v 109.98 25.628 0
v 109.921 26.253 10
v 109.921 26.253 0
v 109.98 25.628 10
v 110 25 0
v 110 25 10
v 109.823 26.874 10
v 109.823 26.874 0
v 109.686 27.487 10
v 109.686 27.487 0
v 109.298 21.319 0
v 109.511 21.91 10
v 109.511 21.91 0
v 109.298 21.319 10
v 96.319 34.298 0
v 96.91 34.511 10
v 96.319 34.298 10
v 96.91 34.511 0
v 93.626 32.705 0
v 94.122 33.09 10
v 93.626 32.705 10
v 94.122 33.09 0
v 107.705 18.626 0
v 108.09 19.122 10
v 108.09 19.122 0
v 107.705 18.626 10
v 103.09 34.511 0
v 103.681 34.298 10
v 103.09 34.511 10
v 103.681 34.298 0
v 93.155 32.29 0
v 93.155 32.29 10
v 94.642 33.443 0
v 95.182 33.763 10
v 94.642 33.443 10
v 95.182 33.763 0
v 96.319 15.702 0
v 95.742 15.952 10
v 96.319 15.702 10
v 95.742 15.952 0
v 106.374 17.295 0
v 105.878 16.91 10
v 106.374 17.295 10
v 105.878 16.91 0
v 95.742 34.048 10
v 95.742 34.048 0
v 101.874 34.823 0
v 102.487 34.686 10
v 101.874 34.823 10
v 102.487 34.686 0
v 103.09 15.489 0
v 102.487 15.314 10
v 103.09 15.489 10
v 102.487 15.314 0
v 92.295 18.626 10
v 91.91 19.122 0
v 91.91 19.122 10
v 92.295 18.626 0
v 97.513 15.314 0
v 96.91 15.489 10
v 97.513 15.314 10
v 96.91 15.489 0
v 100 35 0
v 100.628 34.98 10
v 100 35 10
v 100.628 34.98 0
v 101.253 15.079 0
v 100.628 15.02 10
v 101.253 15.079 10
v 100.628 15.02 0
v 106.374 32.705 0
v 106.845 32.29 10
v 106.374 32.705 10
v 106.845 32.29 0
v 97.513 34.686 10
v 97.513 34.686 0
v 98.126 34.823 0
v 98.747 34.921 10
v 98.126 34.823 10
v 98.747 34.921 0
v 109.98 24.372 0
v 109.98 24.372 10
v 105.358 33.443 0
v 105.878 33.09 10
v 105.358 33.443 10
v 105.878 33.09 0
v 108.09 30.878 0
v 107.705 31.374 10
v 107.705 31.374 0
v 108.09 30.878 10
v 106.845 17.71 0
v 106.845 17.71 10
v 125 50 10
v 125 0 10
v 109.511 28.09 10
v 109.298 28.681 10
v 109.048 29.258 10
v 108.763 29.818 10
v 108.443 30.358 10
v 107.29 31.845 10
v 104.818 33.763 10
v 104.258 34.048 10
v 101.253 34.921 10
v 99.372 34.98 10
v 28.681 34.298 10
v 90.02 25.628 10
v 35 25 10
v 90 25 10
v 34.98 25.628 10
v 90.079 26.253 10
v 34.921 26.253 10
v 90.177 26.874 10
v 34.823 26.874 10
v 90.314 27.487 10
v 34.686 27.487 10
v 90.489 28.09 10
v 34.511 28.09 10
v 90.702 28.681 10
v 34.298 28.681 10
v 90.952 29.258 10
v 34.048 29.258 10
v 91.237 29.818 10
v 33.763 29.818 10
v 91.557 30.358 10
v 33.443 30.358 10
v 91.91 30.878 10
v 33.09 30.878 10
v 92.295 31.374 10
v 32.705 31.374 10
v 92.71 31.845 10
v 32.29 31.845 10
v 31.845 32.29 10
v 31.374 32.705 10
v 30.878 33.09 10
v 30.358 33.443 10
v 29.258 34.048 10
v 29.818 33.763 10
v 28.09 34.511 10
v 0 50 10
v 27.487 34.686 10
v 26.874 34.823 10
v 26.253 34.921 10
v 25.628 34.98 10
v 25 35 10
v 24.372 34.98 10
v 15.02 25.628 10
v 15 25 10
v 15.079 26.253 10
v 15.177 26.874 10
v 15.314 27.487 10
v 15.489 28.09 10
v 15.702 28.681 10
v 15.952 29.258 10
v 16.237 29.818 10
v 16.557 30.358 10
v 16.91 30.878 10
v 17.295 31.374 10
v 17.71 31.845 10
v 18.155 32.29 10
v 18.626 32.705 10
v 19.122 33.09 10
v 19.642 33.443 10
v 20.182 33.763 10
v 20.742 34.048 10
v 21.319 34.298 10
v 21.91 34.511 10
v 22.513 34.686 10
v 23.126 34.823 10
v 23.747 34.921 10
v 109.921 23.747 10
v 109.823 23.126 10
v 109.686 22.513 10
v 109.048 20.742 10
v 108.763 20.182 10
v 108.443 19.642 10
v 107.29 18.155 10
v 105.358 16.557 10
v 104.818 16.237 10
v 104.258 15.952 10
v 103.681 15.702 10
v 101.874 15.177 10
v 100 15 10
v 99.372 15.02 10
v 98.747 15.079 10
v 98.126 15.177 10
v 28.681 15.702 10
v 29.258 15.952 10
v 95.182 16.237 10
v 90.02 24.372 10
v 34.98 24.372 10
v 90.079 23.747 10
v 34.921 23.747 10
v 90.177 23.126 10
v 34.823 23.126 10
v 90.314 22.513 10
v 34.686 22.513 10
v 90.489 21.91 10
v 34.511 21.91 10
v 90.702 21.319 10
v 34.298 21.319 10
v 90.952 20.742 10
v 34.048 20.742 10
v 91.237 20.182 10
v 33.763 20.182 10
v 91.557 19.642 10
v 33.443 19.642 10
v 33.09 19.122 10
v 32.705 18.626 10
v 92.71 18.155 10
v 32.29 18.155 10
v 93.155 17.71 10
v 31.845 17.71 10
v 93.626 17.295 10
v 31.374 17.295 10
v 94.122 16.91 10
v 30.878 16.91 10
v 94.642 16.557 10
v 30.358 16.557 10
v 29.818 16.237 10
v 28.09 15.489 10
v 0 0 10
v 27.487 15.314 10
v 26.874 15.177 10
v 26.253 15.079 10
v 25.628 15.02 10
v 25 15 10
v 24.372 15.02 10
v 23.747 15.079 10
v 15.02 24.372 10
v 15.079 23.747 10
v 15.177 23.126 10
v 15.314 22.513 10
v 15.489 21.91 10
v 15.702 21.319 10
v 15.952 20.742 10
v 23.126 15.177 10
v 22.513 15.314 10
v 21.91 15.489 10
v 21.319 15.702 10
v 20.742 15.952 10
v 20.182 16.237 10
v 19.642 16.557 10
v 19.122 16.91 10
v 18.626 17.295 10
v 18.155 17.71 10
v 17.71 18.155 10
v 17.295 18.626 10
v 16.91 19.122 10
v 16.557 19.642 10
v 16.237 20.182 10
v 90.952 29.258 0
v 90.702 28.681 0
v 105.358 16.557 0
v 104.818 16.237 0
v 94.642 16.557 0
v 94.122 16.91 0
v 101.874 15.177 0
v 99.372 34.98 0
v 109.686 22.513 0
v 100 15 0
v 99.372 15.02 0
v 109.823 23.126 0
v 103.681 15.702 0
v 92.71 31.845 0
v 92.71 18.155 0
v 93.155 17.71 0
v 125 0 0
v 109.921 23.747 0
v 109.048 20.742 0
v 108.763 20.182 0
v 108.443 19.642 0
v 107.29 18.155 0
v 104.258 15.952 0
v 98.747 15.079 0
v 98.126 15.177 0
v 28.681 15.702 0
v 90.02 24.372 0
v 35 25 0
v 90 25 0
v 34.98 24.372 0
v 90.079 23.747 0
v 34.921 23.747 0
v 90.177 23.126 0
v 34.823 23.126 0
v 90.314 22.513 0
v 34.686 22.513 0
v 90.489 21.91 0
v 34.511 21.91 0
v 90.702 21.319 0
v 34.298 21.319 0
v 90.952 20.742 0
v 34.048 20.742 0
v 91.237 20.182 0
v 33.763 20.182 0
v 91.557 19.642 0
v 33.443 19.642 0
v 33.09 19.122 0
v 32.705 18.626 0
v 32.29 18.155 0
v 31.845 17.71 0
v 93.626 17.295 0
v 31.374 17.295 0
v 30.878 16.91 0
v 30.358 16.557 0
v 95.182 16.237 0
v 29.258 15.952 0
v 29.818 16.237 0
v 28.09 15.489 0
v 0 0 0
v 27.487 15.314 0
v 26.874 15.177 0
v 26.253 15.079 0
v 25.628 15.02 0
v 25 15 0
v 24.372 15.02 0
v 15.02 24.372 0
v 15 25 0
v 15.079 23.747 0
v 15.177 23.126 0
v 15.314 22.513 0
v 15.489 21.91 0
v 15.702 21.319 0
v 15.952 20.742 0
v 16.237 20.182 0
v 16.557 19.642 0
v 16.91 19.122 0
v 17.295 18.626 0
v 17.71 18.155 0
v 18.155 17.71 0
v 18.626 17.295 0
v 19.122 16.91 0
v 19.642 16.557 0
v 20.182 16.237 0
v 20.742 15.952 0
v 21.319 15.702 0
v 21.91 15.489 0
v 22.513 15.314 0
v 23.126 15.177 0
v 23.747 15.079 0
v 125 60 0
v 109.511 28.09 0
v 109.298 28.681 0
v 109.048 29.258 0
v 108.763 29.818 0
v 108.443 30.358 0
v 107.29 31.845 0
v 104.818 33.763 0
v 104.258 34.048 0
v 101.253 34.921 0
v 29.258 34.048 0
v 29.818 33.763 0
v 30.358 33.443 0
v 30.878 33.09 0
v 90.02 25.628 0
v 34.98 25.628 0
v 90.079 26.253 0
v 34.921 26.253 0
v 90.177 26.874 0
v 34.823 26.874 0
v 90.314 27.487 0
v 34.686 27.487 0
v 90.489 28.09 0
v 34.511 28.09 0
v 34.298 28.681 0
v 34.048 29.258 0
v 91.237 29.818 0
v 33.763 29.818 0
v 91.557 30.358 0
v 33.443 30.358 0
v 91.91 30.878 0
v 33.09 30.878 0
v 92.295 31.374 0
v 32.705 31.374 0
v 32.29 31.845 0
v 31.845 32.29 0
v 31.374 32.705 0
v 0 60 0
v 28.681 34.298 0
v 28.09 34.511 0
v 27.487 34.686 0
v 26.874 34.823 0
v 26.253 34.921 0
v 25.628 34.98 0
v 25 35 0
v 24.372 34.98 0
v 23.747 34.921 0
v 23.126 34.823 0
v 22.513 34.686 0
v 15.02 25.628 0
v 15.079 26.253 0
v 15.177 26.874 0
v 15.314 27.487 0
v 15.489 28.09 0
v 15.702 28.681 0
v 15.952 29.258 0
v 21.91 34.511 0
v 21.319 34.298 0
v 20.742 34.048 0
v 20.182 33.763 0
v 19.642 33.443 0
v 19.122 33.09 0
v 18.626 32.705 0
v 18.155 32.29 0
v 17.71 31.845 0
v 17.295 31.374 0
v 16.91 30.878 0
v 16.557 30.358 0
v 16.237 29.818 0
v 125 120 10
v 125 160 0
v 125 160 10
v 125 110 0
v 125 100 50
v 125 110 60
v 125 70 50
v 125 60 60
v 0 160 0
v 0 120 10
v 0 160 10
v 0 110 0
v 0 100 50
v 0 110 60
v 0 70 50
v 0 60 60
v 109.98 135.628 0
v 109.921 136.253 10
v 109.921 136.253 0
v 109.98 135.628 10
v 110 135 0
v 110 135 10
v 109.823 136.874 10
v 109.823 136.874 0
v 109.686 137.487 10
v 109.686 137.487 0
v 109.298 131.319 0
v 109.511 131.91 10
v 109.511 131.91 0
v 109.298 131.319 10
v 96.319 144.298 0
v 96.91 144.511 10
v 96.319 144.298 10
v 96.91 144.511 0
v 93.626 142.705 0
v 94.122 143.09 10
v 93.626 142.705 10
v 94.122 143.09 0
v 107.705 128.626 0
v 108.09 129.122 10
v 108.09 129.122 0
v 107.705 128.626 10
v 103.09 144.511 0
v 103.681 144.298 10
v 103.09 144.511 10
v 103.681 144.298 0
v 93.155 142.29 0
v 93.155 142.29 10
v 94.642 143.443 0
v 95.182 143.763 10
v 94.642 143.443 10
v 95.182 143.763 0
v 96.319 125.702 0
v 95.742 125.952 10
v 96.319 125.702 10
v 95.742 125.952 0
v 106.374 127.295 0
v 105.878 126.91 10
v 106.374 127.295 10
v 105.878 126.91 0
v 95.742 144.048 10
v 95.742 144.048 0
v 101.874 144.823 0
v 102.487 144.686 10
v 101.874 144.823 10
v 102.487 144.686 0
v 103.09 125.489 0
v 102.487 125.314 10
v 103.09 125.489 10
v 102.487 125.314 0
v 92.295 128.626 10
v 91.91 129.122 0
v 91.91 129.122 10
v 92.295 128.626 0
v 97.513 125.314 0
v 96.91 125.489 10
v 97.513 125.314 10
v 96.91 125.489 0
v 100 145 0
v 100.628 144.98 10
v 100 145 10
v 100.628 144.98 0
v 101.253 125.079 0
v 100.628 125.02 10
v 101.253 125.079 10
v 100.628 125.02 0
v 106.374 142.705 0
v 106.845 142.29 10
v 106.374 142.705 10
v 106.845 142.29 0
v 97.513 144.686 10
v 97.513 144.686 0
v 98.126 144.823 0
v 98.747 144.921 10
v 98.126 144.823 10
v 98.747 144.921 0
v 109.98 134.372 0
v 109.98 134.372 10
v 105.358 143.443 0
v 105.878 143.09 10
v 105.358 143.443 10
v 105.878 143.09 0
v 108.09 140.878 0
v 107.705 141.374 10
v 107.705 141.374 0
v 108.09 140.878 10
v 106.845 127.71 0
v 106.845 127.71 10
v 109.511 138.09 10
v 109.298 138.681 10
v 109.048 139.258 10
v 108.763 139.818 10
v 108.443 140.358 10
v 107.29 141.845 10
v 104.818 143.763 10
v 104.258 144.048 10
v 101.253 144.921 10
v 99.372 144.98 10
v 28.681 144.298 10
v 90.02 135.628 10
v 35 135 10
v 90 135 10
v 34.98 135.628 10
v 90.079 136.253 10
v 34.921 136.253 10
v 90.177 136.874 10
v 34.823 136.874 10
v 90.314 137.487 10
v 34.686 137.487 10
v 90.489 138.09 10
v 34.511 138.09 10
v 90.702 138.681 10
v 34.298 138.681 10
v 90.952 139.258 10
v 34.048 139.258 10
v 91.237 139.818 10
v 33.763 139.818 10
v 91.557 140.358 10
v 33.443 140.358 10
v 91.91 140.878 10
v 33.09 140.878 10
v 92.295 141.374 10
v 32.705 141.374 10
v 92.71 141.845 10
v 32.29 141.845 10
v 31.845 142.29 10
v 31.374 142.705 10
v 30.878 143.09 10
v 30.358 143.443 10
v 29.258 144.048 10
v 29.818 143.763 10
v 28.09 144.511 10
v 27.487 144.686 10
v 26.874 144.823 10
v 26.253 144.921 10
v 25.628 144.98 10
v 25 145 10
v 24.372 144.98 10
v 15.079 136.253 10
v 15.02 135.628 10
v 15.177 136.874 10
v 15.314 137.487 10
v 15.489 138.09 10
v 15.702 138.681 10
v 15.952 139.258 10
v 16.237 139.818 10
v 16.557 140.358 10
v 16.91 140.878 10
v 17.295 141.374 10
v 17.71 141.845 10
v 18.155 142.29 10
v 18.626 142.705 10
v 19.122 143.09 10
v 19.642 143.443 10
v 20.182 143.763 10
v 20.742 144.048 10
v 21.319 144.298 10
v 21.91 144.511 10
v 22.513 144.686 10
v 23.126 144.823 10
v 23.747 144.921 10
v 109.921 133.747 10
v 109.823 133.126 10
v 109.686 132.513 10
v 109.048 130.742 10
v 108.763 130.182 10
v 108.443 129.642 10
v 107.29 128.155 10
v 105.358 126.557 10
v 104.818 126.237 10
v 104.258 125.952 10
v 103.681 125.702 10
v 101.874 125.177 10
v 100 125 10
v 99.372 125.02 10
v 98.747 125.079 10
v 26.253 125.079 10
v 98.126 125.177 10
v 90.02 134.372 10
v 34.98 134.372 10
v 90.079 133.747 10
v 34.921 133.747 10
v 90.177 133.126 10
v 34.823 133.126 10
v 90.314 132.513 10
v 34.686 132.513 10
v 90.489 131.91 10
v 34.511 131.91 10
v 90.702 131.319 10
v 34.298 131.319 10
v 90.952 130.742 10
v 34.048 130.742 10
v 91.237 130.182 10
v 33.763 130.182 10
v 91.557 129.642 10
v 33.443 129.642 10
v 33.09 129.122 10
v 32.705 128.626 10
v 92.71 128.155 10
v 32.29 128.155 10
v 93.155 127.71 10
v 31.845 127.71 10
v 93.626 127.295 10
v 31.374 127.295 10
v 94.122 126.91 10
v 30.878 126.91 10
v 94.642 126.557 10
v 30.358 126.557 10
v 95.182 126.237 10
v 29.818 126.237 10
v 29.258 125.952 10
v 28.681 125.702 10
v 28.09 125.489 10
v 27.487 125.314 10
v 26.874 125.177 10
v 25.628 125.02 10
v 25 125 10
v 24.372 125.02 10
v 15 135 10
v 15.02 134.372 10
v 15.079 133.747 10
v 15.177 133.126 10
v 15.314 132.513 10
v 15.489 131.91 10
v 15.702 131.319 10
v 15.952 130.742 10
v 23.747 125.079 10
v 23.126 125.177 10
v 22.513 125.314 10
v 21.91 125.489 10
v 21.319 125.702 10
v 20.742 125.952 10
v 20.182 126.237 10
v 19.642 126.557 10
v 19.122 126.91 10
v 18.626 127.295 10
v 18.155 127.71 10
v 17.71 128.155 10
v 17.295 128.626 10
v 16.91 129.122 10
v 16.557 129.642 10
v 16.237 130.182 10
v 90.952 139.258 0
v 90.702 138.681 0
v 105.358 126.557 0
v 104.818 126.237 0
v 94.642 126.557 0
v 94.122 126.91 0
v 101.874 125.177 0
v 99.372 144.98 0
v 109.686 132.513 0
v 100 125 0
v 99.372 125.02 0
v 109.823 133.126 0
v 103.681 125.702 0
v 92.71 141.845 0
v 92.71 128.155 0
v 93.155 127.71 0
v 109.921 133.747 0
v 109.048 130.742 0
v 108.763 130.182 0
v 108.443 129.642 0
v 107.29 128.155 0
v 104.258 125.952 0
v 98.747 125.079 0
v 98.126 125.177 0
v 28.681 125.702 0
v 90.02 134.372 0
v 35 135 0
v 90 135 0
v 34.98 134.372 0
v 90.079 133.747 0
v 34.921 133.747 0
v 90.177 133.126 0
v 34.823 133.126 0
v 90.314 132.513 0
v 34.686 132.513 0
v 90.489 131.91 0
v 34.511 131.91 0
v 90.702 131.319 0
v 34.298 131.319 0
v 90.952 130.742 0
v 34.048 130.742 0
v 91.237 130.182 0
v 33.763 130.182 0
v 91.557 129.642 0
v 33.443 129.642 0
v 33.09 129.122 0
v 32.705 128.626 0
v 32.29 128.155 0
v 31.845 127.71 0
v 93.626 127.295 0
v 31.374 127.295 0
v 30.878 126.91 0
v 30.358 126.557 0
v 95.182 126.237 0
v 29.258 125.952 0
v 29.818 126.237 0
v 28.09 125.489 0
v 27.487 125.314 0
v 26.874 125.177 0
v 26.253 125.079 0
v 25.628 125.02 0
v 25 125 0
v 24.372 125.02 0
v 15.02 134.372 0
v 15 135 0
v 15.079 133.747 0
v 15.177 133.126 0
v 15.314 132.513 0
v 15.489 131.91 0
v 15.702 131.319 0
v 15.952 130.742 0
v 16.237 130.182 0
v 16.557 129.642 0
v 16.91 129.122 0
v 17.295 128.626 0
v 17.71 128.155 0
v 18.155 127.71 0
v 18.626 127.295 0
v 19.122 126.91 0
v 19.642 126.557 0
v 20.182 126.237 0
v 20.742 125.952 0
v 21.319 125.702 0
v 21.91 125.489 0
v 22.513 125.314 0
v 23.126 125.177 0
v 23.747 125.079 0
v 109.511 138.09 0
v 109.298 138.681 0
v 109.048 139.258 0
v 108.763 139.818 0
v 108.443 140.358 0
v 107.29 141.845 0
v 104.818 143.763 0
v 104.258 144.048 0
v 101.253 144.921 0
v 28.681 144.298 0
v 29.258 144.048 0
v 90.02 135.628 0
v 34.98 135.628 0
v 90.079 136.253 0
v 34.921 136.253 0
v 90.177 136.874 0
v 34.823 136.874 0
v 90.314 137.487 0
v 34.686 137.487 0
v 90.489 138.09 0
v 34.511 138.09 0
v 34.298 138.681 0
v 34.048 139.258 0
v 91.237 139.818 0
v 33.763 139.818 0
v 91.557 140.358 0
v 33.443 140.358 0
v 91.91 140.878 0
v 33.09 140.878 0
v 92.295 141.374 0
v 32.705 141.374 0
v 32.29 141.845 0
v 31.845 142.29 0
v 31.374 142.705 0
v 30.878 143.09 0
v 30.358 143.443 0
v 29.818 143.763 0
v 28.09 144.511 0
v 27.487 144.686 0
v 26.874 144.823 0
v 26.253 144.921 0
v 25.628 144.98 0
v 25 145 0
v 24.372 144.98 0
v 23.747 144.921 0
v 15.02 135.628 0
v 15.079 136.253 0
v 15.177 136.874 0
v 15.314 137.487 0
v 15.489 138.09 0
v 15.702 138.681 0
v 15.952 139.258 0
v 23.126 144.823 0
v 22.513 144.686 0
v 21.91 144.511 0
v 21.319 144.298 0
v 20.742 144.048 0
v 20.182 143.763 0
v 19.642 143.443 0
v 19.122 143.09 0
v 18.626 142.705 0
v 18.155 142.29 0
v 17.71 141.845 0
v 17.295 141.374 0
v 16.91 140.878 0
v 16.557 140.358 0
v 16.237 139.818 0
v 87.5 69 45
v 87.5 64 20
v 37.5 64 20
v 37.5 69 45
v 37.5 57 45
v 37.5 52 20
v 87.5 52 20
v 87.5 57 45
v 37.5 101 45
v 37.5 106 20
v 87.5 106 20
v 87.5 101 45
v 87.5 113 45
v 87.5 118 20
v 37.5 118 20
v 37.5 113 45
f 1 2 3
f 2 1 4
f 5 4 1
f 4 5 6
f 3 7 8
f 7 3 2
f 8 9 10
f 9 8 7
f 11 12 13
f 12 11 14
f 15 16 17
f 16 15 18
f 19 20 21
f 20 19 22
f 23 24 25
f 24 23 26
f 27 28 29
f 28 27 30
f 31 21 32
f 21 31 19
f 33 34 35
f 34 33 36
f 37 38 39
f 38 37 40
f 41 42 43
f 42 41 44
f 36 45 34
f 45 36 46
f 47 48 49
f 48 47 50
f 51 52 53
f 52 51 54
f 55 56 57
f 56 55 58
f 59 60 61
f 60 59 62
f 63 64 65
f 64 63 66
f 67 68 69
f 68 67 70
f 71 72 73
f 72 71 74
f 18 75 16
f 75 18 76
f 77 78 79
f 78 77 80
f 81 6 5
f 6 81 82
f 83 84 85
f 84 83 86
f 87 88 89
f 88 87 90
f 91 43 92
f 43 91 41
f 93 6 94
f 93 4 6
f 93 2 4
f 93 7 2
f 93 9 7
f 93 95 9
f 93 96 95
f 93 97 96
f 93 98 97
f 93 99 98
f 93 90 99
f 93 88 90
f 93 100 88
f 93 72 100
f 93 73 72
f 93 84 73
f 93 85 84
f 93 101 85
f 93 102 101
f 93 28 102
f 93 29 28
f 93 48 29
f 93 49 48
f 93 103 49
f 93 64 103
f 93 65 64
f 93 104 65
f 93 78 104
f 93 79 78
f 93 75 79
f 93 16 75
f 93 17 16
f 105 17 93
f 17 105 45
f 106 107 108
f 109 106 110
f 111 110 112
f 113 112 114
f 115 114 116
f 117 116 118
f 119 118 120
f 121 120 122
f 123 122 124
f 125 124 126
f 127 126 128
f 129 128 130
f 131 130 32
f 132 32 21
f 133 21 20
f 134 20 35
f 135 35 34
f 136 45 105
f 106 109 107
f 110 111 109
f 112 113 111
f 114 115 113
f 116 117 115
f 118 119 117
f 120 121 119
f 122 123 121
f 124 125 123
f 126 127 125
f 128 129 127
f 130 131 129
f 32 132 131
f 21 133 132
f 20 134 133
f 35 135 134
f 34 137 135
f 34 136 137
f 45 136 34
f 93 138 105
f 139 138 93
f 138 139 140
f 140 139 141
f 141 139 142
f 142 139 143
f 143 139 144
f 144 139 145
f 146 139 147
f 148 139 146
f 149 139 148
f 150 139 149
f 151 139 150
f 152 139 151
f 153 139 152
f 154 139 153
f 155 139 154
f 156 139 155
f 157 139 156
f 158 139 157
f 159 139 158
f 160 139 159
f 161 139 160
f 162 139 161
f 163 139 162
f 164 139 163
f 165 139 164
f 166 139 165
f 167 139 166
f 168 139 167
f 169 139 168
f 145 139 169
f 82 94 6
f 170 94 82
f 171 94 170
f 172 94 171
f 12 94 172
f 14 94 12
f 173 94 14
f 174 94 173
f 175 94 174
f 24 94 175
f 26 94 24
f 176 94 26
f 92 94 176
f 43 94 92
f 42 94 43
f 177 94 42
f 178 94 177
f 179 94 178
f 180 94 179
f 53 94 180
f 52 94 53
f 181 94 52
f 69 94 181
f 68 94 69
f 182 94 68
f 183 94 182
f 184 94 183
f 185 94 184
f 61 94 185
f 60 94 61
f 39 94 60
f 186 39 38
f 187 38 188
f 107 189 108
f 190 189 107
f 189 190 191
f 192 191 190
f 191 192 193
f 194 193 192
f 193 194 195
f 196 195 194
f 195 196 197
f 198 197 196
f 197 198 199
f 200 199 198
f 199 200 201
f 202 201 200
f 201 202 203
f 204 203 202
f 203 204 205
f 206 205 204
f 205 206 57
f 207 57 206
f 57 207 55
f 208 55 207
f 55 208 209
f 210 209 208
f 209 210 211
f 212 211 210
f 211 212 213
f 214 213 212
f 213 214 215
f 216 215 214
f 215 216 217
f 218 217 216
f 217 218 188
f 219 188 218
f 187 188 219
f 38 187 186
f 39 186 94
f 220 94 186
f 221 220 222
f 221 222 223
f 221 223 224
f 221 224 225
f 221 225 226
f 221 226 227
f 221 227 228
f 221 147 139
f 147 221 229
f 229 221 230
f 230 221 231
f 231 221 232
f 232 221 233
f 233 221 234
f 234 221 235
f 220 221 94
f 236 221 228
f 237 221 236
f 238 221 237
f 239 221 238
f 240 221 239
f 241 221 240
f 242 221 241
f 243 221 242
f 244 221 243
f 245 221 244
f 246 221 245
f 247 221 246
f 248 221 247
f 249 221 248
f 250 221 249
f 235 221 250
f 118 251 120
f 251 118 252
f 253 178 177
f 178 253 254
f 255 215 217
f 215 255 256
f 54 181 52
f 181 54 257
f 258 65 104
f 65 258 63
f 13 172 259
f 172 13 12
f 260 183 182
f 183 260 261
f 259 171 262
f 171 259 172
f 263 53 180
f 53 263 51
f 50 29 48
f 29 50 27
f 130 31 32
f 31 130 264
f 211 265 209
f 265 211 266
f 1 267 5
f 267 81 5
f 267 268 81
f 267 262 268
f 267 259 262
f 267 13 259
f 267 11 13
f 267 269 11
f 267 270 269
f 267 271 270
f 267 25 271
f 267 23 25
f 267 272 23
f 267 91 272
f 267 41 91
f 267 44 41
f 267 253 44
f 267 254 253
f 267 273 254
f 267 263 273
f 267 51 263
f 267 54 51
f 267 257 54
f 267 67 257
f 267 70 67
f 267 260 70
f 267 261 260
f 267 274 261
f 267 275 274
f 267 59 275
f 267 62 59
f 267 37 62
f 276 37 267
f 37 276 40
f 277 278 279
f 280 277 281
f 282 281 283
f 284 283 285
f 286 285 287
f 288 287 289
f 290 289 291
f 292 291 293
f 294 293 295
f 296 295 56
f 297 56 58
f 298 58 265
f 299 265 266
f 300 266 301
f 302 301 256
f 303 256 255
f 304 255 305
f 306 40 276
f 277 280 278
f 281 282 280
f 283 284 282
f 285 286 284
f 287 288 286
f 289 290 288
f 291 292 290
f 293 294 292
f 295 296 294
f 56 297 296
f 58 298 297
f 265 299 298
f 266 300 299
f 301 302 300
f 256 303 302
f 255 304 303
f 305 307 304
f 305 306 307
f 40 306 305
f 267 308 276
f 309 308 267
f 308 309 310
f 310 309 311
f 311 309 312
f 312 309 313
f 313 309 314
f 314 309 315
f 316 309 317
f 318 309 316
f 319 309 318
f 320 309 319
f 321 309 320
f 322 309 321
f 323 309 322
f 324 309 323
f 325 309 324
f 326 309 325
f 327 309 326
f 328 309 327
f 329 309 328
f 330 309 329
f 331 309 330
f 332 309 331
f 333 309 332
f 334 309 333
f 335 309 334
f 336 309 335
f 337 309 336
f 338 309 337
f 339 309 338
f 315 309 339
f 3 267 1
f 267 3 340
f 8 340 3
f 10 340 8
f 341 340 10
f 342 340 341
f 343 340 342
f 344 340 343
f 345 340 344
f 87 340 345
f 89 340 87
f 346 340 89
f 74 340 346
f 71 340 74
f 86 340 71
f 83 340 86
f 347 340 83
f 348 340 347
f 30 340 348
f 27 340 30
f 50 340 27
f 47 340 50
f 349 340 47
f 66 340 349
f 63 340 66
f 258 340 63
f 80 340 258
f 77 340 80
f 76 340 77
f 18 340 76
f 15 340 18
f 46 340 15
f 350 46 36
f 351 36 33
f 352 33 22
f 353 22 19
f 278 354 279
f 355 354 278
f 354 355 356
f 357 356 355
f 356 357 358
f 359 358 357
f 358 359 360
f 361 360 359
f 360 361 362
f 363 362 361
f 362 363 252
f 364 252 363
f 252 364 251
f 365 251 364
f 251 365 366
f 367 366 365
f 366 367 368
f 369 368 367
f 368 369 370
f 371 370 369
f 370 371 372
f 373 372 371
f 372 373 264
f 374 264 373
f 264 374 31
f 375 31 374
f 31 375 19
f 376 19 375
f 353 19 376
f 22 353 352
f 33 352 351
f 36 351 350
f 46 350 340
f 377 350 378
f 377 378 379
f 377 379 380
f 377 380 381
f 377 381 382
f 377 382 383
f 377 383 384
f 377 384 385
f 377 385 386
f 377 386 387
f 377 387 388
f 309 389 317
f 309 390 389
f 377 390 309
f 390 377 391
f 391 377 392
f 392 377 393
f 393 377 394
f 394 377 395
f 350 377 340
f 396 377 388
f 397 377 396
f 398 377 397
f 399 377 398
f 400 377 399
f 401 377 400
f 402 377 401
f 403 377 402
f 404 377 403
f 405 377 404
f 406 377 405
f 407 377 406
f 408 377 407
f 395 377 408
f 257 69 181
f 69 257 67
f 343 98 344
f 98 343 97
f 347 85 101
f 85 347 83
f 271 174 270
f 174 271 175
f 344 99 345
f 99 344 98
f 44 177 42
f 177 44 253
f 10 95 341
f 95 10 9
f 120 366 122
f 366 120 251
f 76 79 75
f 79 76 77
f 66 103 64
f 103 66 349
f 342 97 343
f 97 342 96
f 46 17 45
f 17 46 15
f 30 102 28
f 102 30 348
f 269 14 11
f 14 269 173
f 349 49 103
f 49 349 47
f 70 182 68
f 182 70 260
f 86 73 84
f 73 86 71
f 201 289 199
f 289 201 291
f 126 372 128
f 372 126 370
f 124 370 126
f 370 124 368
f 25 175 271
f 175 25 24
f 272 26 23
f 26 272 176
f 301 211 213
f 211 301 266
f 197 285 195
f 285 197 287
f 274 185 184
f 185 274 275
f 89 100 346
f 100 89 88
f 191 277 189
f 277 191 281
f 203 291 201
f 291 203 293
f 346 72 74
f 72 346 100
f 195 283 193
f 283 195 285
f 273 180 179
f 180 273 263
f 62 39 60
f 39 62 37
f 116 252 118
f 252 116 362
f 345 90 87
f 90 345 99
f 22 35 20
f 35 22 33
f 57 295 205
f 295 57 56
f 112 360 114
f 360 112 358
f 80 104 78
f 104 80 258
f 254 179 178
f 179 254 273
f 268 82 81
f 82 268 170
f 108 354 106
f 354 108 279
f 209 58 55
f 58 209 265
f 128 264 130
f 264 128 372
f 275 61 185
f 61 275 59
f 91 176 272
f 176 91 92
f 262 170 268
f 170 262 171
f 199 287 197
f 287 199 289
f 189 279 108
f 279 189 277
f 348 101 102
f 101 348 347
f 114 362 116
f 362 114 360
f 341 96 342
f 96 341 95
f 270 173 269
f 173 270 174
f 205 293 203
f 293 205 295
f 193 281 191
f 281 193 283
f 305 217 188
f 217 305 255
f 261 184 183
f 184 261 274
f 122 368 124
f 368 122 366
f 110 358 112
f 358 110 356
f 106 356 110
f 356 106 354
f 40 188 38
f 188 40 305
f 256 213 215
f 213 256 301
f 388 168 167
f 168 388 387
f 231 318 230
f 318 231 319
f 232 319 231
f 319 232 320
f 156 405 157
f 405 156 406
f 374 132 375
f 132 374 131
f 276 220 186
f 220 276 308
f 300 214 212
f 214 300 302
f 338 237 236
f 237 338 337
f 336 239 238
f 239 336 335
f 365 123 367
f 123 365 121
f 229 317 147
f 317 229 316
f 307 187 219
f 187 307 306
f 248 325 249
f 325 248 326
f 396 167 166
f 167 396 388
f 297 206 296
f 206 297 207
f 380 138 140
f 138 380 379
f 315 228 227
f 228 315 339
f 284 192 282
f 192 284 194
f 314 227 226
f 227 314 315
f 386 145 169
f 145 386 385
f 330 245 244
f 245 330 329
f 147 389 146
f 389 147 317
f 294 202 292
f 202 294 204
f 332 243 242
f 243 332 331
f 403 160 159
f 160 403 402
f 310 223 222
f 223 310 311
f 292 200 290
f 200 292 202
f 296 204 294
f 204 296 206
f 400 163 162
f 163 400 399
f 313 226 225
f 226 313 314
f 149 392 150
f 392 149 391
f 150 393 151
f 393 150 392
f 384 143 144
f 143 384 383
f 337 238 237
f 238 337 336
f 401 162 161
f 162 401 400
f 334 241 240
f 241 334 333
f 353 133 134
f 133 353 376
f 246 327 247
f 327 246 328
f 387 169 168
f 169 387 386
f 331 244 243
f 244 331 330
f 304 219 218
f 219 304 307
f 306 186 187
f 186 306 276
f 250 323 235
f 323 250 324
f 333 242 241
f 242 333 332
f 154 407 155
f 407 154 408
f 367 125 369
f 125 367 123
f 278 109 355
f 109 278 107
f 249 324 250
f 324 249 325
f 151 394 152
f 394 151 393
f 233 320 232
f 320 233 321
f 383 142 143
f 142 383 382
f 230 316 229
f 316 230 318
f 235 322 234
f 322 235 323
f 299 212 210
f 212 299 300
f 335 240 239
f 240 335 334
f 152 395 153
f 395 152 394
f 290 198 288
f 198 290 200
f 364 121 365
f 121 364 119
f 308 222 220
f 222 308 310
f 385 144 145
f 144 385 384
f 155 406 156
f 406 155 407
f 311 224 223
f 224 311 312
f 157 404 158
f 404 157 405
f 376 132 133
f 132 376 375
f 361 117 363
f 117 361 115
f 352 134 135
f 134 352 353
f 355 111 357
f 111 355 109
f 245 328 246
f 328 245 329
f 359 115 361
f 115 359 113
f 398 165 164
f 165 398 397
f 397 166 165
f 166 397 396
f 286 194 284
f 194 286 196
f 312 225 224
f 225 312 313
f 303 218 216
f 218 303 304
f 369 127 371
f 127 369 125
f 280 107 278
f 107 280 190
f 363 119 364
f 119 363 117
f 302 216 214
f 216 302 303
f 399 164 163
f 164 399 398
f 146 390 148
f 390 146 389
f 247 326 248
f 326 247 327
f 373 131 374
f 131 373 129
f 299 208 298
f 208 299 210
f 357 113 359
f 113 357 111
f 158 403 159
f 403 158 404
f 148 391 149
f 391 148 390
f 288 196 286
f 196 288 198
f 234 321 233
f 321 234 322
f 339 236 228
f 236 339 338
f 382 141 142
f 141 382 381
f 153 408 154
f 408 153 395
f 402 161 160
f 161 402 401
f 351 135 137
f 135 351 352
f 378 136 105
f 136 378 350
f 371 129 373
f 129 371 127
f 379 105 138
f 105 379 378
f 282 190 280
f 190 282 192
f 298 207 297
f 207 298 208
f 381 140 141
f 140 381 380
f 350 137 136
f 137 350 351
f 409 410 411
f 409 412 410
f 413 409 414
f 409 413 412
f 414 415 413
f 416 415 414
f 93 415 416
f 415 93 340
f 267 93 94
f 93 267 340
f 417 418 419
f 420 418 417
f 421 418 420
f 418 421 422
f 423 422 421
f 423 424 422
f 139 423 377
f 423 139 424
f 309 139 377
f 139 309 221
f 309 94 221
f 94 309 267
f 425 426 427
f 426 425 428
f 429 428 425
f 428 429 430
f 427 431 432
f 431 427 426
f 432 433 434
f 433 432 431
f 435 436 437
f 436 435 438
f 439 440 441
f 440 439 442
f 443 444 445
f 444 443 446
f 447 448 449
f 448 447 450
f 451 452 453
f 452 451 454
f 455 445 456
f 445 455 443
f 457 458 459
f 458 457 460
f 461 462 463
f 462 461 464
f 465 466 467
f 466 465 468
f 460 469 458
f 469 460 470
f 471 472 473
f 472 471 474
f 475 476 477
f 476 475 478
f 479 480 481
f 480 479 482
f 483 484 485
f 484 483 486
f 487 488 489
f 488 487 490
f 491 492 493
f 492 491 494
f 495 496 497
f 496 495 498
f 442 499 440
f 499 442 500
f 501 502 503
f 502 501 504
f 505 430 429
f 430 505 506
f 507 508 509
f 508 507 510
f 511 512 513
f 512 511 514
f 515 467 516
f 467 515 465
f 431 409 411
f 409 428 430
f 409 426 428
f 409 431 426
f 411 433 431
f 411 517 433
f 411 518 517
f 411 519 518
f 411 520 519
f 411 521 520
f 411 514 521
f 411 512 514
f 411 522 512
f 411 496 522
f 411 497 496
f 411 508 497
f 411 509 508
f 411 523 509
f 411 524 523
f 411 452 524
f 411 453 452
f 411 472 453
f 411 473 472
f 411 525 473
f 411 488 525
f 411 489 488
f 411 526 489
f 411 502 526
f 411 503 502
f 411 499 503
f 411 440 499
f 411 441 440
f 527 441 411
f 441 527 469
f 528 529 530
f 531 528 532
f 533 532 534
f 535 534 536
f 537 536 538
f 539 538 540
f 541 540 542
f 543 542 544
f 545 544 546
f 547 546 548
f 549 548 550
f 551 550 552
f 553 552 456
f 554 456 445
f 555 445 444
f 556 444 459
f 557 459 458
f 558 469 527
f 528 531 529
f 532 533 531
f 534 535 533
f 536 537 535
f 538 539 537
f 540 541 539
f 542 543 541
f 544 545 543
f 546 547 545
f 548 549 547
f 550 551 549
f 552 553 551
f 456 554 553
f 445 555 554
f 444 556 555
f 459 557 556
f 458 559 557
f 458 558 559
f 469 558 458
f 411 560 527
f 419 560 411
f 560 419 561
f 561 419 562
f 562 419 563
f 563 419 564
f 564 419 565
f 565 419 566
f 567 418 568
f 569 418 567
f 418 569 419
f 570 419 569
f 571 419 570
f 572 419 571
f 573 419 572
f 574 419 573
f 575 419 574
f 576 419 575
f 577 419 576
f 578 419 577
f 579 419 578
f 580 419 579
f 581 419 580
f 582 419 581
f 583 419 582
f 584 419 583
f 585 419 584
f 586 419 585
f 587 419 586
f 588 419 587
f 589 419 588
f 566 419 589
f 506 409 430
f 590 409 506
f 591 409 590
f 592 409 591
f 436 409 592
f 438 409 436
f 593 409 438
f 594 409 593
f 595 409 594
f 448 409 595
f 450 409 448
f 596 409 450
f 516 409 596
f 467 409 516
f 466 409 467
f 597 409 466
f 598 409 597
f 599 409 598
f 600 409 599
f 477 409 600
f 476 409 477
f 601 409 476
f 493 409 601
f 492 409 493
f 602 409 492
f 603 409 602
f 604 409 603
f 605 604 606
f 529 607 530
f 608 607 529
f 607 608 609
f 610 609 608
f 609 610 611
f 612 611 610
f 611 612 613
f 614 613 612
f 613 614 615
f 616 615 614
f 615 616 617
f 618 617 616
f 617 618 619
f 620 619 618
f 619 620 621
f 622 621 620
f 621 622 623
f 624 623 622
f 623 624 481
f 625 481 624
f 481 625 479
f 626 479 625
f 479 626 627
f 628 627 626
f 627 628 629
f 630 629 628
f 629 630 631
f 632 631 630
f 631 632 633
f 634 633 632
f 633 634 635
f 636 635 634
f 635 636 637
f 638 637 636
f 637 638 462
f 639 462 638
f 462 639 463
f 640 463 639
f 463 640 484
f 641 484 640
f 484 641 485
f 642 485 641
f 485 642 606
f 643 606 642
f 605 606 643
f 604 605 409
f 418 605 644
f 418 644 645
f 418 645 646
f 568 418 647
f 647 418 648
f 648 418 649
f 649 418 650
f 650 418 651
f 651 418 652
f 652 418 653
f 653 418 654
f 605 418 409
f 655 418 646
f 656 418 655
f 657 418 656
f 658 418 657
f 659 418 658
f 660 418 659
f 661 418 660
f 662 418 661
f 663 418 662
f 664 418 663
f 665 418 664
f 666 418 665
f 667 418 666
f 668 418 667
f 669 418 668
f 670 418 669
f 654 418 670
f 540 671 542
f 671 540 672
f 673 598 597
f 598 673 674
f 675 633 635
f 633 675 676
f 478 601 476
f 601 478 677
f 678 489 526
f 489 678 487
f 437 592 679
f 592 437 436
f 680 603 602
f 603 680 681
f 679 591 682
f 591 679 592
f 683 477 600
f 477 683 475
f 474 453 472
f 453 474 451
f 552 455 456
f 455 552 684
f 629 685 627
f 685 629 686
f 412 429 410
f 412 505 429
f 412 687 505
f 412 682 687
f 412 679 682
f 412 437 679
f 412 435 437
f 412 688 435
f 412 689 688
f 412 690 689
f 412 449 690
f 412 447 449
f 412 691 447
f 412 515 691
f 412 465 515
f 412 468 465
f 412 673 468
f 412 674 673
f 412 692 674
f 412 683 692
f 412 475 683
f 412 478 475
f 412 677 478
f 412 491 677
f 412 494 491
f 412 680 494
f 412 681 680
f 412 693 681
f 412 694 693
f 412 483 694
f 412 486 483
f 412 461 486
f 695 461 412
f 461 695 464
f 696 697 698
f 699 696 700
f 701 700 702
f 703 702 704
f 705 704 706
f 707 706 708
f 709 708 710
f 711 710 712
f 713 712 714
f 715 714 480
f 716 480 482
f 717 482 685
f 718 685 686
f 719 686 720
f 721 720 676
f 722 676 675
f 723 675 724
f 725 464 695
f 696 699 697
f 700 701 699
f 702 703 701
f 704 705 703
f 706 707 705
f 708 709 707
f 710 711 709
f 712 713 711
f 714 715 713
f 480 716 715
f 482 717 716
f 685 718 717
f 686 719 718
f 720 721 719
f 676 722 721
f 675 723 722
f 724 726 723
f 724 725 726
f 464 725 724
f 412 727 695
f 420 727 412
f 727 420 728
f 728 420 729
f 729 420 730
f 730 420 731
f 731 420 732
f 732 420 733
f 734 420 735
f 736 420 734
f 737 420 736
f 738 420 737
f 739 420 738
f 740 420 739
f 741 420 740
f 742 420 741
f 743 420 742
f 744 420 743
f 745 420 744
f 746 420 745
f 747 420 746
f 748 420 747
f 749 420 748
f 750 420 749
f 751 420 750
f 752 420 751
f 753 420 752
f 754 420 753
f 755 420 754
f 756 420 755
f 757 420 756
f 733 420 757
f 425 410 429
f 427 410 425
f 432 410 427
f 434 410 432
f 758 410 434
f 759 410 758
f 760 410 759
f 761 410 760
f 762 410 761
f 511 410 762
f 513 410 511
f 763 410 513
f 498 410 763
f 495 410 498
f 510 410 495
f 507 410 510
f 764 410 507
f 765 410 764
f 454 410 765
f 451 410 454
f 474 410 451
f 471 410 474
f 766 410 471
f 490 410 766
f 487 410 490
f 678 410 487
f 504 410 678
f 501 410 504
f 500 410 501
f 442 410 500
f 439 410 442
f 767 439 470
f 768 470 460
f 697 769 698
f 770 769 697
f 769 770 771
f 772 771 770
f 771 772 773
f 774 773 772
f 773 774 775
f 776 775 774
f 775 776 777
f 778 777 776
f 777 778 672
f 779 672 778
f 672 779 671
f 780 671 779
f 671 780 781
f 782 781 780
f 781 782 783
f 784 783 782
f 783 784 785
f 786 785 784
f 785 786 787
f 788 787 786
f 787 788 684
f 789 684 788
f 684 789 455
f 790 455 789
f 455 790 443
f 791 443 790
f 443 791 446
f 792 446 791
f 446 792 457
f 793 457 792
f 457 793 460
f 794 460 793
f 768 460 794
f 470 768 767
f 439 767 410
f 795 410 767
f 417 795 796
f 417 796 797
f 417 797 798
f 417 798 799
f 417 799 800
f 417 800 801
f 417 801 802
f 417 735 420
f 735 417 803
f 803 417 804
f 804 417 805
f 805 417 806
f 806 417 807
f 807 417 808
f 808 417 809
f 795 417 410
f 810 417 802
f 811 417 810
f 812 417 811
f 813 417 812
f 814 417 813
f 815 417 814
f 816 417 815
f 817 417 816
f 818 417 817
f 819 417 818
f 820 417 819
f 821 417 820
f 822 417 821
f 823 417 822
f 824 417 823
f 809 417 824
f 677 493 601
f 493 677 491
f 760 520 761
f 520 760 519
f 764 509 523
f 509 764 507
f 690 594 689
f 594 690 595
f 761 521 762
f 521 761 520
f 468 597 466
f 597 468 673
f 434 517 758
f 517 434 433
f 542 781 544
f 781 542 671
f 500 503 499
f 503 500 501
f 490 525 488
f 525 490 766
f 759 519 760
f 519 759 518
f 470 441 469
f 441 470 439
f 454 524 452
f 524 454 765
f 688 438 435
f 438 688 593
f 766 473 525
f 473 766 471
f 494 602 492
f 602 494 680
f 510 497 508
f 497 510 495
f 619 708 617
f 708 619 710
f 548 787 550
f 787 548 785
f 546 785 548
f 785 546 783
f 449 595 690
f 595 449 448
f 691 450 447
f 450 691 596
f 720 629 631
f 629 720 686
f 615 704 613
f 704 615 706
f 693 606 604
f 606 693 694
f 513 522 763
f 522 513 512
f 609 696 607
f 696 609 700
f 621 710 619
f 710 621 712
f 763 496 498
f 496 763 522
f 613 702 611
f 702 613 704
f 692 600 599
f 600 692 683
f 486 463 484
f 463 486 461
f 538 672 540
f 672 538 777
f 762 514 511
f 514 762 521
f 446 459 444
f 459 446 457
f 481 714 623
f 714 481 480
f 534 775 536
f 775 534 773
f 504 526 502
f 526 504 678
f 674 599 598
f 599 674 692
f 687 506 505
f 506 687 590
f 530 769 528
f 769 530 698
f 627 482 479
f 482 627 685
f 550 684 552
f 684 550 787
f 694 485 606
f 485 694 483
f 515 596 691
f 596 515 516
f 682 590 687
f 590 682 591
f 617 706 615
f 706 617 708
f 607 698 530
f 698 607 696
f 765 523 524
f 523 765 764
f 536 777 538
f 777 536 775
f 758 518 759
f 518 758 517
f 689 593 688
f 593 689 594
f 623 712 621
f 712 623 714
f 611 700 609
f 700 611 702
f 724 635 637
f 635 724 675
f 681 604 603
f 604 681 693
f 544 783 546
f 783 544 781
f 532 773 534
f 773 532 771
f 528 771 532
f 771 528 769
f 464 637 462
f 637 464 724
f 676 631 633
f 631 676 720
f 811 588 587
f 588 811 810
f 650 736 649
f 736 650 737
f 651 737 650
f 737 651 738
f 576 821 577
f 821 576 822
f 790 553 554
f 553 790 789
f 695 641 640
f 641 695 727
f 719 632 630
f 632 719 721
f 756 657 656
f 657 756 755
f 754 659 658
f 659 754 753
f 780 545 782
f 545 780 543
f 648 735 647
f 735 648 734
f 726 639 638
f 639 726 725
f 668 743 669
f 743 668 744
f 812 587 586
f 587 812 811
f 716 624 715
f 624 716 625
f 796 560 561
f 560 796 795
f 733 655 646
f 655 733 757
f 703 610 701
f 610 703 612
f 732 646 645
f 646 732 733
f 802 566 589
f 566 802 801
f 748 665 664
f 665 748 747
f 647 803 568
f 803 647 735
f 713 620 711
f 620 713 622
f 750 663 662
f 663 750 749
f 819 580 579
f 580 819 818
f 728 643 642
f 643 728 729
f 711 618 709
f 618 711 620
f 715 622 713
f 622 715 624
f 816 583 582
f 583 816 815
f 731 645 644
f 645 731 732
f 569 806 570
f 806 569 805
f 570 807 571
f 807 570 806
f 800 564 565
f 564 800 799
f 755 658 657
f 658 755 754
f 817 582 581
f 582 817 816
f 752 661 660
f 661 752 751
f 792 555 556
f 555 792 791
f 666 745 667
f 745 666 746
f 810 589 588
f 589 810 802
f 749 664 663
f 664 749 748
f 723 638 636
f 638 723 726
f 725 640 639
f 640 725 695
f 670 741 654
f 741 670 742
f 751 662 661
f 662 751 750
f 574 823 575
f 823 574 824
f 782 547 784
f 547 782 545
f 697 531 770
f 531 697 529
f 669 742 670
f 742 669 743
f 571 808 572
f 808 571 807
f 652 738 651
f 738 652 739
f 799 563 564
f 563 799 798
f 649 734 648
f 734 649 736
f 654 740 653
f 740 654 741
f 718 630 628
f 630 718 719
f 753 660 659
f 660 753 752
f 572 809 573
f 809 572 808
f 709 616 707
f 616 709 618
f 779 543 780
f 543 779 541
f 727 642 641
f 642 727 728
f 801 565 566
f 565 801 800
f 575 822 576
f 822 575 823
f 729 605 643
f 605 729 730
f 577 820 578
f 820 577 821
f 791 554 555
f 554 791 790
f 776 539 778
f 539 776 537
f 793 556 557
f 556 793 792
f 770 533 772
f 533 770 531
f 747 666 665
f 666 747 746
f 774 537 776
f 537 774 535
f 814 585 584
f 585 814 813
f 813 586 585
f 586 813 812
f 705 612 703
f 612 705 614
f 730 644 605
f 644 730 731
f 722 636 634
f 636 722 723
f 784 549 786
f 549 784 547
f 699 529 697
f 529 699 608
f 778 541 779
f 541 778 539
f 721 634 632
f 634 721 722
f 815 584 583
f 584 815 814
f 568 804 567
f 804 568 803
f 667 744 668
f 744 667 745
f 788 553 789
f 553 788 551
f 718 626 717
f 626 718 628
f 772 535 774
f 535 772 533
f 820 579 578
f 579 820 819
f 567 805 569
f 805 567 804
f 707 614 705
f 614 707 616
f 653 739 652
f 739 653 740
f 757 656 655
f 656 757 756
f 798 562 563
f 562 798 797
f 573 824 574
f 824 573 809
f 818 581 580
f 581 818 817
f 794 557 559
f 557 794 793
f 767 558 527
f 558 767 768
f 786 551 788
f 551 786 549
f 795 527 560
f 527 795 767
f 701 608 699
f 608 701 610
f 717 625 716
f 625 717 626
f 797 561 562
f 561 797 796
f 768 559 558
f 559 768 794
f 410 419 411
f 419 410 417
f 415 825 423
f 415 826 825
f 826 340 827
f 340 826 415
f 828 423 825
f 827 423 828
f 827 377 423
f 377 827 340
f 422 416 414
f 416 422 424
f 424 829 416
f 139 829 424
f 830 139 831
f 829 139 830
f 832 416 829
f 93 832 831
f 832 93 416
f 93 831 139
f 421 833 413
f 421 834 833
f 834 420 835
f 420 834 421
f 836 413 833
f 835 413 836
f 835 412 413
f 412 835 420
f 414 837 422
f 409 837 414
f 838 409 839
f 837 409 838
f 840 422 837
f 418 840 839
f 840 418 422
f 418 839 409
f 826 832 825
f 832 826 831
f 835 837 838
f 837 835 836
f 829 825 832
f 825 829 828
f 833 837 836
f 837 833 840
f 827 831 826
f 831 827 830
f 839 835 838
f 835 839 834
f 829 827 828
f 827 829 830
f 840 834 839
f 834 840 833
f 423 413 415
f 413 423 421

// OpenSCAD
// file: library.scad
//READ ME
/* List of things to add 
1. annulus flat tube
*/


// bug finder
//assert(TranslatX!=undef, "X translation is required");

//Module list
//orbital_cylinders(ObitalDistance ,NumberOfCylinders , cylinderRadius, cylinderHeight);
//anulus(outerRadius, innerRadius, cylinderHeight);
    //anulus_hull(outerRadius, innerRadius, cylinderHeight, BetweenCenters)
    //anulus_TanCut(outerRadius, innerRadius, cylinderHeight, tanCutWidth);
    //anulus_body(outerRadius, innerRadius, cylinderHeight, height);
//anulus_cube(outerX, outerY, innerX, innerY, HeightZ);
//cube_cut(DepthX, WidthY, HeightZ, TranslateX, TranslateY, TranslateZ);
//cylinder_cut(cylHeight, cylRadius, TranslateX, TranslateY, TranslateZ, rotateX, rotateY, rotateZ);
//rounded_corner(circleRadius,Thickness);
//triangle(Height, length, Depth);
//bent_pipe(outerRadius, innerRadius, obritalDis, angleHere);
//bent_cube(outerXlength, outerYlength, innerXlength, innerYlength, obritalDis, angleHere);



//------------------------------------------------------------------------------------------------------------------------
module orbital_cylinders(ObitalDistance ,NumberOfCylinders , cylinderRadius, cylinderHeight){
    // Will generate a set of orbiting cylinders base on the values you give it.
    for (Holes = [0:360/NumberOfCylinders:360] ){
        rotate([0, 0, Holes])
        translate([ObitalDistance, 0, 0])
        cylinder(cylinderHeight, r = cylinderRadius);
        }// hehe cuts circles in a circle
        
        // Starting with the DISTANCE from the X ORIGIN to the X EDGE of the circle .ie (Radius)
}       // The obiting cylinders will be evenly spaced starting on the X line.
        // To finish the orbiting cylinders will also be defined in RADIUS,
        // just acted like they're normal cylinders they don't like being called clones.
//------------------------------------------------------------------------------------------------------------------------
module anulus(outerRadius, innerRadius, cylinderHeight){
    difference(){
        cylinder(cylinderHeight, r = outerRadius);
        
        cylinder(cylinderHeight, r = innerRadius);
        }
    }

//------------------------------------------------------------------------------------------------------------------------
module anulus_hull(outerRadius, innerRadius, cylinderHeight, BetweenCenters){
    difference(){
        hull(){
            cylinder(cylinderHeight, r = outerRadius);
        
            translate([BetweenCenters, 0, 0])
                cylinder(cylinderHeight, r = outerRadius);
        }
       hull(){    
        cylinder(cylinderHeight, r = innerRadius);
        
        translate([BetweenCenters, 0, 0])
            cylinder(cylinderHeight, r = innerRadius);   
       }
        
        }
    }

//-------------------------------------------------------------------
module anulus_TanCut(outerRadius, innerRadius, cylinderHeight, tanCutWidth){
   TanCutDepth = outerRadius - sqrt((outerRadius * outerRadius) - (tanCutWidth * tanCutWidth));
   
    difference(){
        cylinder(cylinderHeight, r = outerRadius);
        
        cylinder(cylinderHeight, r = innerRadius);
        
        translate([outerRadius - TanCutDepth , -outerRadius, 0])
            cube([outerRadius, outerRadius * 2, cylinderHeight]);   
        
        }
    }
//---------------------------------------------------------------
module anulus_body(outerRadius, innerRadius, cylinderHeight, height){
    anulus();
    difference(){
        translate([0 , -outerRadius, 0])
            cube([height, outerRadius * 2, cylinderHeight]);

        cylinder(cylinderHeight, r = outerRadius);
        }
    }
    
//------------------------------------------------------------------------------------------------------------------------
module anulus_cube(outerX, outerY, innerX, innerY, HeightZ){
    difference(){
        cube([ outerX, outerY, HeightZ], true);
        cube([ innerX, innerY, HeightZ],true);
        }
    }
//------------------------------------------------------------------------------------------------------------------------
module cube_cut( DepthX, WidthY, HeightZ, TranslateX, TranslateY, TranslateZ ){
    translate([ TranslateX, TranslateY, TranslateZ])
        cube([ DepthX, WidthY, HeightZ]);
    }
//------------------------------------------------------------------------------------------------------------------------
module cylinder_cut(cylHeight, cylRadius, TranslateX, TranslateY, TranslateZ, rotateX, rotateY, rotateZ){
translate([TranslateX, TranslateY, TranslateZ])
    rotate([rotateX, rotateY, rotateZ])
        cylinder(cylHeight, r = cylRadius);
    assert(TranslateY!=undef, "X translation is required"); 
}
//------------------------------------------------------------------------------------------------------------------------
module rounded_corner(circleRadius,Thickness){// Rounds a corner on a cube.
    difference(){
        translate([ -circleRadius, -circleRadius, 0])
            cube([circleRadius * 2, circleRadius * 2, Thickness]); 

        translate([ -circleRadius, -circleRadius * 2, 0])
            cube([circleRadius * 2, circleRadius * 2, Thickness]);

        translate([ -circleRadius * 2, 0, 0])
            cube([circleRadius * 2, circleRadius * 2, Thickness]);

            cylinder(Thickness,r = circleRadius, true);
    }  
    }
//------------------------------------------------------------------------------------------------------------------------
module triangle(Length, Height, Depth){
    linear_extrude(Depth){
        polygon( points = [[0, 0],[Height, 0],[0, Length],[0, 0]]);
    }
        }
//------------------------------------------------------------------------------------------------------------------------
module bent_pipe(outerRadius, innerRadius, obritalDis, angleHere){
rotate_extrude(angle = angleHere,convexity = 10){
translate([obritalDis, 0, 0])
    difference(){
        circle(outerRadius);
        circle(innerRadius);
        
        }
    }
}
//------------------------------------------------------------------------------------------------------------------------
module bent_cube(outerXlength, outerYlength, innerXlength, innerYlength, obritalDis, angleHere){
rotate_extrude(angle = angleHere,convexity = 10){
translate([obritalDis + outerXlength / 2, outerYlength / 2, 0])
    difference(){
        square([outerXlength, outerYlength], center = true);
        square([innerXlength, innerYlength], center = true);
        
        }
    }
}
//------------------------------------------------------------------------------------------------------------------------    
    
    
    
    
    
    
    
// main file
$fn = 100;
mm = 1;
degree = 1;
diameter = .5;
use <library.scad>

OverAllLength = 160;
PlateWidth = 50;
PlateDepth = 125;
PlateHeight = 10;
TopCubeZoffset = 60;

render(){
Plate();
translate([0, OverAllLength - PlateWidth, 0])
    Plate();
VPlate();
VPlate();
}

module Plate(){

    
    ObitalDistance = 75 * diameter;
    NumberOfCylinders = 2;
    cylinderRadius = 20 * diameter;
    
    difference(){
        cube([PlateDepth, PlateWidth, PlateHeight]);
        
        translate([PlateDepth / 2, PlateWidth / 2, 0])
            orbital_cylinders(ObitalDistance ,NumberOfCylinders , cylinderRadius, PlateHeight);  
        }
    }
    
module VPlate(){
    TopCubeWidth = 35;
    centerDifference = OverAllLength - PlateWidth * 2 - TopCubeWidth;
    
    translate([0, OverAllLength / 2 - centerDifference / 2, TopCubeZoffset - PlateHeight])
        cube([PlateDepth, TopCubeWidth, PlateHeight]);
    
    difference(){
        union(){
            hull(){//Left incline
                translate([0, PlateWidth + PlateHeight, TopCubeZoffset - PlateHeight])
                    cube([PlateDepth, PlateHeight, PlateHeight]);

                translate([0, PlateWidth, 0])
                    cube([PlateDepth, PlateHeight, PlateHeight]);
            }
            
            hull(){//Right incline
                translate([0, OverAllLength - PlateWidth - PlateHeight, TopCubeZoffset - PlateHeight])
                    cube([PlateDepth, PlateHeight, PlateHeight]);

                translate([0, OverAllLength - PlateWidth, 0])
                    cube([PlateDepth, PlateHeight, PlateHeight]);
            }
    }
        CutCubeDepth = 50;
        CutCubeHeight = 25;
        OffTheTopCut = 15;
        Xoffset      = 37.5;
            translate([Xoffset, 0, TopCubeZoffset - OffTheTopCut - CutCubeHeight])
                cube([CutCubeDepth, OverAllLength, CutCubeHeight]);
}
}
